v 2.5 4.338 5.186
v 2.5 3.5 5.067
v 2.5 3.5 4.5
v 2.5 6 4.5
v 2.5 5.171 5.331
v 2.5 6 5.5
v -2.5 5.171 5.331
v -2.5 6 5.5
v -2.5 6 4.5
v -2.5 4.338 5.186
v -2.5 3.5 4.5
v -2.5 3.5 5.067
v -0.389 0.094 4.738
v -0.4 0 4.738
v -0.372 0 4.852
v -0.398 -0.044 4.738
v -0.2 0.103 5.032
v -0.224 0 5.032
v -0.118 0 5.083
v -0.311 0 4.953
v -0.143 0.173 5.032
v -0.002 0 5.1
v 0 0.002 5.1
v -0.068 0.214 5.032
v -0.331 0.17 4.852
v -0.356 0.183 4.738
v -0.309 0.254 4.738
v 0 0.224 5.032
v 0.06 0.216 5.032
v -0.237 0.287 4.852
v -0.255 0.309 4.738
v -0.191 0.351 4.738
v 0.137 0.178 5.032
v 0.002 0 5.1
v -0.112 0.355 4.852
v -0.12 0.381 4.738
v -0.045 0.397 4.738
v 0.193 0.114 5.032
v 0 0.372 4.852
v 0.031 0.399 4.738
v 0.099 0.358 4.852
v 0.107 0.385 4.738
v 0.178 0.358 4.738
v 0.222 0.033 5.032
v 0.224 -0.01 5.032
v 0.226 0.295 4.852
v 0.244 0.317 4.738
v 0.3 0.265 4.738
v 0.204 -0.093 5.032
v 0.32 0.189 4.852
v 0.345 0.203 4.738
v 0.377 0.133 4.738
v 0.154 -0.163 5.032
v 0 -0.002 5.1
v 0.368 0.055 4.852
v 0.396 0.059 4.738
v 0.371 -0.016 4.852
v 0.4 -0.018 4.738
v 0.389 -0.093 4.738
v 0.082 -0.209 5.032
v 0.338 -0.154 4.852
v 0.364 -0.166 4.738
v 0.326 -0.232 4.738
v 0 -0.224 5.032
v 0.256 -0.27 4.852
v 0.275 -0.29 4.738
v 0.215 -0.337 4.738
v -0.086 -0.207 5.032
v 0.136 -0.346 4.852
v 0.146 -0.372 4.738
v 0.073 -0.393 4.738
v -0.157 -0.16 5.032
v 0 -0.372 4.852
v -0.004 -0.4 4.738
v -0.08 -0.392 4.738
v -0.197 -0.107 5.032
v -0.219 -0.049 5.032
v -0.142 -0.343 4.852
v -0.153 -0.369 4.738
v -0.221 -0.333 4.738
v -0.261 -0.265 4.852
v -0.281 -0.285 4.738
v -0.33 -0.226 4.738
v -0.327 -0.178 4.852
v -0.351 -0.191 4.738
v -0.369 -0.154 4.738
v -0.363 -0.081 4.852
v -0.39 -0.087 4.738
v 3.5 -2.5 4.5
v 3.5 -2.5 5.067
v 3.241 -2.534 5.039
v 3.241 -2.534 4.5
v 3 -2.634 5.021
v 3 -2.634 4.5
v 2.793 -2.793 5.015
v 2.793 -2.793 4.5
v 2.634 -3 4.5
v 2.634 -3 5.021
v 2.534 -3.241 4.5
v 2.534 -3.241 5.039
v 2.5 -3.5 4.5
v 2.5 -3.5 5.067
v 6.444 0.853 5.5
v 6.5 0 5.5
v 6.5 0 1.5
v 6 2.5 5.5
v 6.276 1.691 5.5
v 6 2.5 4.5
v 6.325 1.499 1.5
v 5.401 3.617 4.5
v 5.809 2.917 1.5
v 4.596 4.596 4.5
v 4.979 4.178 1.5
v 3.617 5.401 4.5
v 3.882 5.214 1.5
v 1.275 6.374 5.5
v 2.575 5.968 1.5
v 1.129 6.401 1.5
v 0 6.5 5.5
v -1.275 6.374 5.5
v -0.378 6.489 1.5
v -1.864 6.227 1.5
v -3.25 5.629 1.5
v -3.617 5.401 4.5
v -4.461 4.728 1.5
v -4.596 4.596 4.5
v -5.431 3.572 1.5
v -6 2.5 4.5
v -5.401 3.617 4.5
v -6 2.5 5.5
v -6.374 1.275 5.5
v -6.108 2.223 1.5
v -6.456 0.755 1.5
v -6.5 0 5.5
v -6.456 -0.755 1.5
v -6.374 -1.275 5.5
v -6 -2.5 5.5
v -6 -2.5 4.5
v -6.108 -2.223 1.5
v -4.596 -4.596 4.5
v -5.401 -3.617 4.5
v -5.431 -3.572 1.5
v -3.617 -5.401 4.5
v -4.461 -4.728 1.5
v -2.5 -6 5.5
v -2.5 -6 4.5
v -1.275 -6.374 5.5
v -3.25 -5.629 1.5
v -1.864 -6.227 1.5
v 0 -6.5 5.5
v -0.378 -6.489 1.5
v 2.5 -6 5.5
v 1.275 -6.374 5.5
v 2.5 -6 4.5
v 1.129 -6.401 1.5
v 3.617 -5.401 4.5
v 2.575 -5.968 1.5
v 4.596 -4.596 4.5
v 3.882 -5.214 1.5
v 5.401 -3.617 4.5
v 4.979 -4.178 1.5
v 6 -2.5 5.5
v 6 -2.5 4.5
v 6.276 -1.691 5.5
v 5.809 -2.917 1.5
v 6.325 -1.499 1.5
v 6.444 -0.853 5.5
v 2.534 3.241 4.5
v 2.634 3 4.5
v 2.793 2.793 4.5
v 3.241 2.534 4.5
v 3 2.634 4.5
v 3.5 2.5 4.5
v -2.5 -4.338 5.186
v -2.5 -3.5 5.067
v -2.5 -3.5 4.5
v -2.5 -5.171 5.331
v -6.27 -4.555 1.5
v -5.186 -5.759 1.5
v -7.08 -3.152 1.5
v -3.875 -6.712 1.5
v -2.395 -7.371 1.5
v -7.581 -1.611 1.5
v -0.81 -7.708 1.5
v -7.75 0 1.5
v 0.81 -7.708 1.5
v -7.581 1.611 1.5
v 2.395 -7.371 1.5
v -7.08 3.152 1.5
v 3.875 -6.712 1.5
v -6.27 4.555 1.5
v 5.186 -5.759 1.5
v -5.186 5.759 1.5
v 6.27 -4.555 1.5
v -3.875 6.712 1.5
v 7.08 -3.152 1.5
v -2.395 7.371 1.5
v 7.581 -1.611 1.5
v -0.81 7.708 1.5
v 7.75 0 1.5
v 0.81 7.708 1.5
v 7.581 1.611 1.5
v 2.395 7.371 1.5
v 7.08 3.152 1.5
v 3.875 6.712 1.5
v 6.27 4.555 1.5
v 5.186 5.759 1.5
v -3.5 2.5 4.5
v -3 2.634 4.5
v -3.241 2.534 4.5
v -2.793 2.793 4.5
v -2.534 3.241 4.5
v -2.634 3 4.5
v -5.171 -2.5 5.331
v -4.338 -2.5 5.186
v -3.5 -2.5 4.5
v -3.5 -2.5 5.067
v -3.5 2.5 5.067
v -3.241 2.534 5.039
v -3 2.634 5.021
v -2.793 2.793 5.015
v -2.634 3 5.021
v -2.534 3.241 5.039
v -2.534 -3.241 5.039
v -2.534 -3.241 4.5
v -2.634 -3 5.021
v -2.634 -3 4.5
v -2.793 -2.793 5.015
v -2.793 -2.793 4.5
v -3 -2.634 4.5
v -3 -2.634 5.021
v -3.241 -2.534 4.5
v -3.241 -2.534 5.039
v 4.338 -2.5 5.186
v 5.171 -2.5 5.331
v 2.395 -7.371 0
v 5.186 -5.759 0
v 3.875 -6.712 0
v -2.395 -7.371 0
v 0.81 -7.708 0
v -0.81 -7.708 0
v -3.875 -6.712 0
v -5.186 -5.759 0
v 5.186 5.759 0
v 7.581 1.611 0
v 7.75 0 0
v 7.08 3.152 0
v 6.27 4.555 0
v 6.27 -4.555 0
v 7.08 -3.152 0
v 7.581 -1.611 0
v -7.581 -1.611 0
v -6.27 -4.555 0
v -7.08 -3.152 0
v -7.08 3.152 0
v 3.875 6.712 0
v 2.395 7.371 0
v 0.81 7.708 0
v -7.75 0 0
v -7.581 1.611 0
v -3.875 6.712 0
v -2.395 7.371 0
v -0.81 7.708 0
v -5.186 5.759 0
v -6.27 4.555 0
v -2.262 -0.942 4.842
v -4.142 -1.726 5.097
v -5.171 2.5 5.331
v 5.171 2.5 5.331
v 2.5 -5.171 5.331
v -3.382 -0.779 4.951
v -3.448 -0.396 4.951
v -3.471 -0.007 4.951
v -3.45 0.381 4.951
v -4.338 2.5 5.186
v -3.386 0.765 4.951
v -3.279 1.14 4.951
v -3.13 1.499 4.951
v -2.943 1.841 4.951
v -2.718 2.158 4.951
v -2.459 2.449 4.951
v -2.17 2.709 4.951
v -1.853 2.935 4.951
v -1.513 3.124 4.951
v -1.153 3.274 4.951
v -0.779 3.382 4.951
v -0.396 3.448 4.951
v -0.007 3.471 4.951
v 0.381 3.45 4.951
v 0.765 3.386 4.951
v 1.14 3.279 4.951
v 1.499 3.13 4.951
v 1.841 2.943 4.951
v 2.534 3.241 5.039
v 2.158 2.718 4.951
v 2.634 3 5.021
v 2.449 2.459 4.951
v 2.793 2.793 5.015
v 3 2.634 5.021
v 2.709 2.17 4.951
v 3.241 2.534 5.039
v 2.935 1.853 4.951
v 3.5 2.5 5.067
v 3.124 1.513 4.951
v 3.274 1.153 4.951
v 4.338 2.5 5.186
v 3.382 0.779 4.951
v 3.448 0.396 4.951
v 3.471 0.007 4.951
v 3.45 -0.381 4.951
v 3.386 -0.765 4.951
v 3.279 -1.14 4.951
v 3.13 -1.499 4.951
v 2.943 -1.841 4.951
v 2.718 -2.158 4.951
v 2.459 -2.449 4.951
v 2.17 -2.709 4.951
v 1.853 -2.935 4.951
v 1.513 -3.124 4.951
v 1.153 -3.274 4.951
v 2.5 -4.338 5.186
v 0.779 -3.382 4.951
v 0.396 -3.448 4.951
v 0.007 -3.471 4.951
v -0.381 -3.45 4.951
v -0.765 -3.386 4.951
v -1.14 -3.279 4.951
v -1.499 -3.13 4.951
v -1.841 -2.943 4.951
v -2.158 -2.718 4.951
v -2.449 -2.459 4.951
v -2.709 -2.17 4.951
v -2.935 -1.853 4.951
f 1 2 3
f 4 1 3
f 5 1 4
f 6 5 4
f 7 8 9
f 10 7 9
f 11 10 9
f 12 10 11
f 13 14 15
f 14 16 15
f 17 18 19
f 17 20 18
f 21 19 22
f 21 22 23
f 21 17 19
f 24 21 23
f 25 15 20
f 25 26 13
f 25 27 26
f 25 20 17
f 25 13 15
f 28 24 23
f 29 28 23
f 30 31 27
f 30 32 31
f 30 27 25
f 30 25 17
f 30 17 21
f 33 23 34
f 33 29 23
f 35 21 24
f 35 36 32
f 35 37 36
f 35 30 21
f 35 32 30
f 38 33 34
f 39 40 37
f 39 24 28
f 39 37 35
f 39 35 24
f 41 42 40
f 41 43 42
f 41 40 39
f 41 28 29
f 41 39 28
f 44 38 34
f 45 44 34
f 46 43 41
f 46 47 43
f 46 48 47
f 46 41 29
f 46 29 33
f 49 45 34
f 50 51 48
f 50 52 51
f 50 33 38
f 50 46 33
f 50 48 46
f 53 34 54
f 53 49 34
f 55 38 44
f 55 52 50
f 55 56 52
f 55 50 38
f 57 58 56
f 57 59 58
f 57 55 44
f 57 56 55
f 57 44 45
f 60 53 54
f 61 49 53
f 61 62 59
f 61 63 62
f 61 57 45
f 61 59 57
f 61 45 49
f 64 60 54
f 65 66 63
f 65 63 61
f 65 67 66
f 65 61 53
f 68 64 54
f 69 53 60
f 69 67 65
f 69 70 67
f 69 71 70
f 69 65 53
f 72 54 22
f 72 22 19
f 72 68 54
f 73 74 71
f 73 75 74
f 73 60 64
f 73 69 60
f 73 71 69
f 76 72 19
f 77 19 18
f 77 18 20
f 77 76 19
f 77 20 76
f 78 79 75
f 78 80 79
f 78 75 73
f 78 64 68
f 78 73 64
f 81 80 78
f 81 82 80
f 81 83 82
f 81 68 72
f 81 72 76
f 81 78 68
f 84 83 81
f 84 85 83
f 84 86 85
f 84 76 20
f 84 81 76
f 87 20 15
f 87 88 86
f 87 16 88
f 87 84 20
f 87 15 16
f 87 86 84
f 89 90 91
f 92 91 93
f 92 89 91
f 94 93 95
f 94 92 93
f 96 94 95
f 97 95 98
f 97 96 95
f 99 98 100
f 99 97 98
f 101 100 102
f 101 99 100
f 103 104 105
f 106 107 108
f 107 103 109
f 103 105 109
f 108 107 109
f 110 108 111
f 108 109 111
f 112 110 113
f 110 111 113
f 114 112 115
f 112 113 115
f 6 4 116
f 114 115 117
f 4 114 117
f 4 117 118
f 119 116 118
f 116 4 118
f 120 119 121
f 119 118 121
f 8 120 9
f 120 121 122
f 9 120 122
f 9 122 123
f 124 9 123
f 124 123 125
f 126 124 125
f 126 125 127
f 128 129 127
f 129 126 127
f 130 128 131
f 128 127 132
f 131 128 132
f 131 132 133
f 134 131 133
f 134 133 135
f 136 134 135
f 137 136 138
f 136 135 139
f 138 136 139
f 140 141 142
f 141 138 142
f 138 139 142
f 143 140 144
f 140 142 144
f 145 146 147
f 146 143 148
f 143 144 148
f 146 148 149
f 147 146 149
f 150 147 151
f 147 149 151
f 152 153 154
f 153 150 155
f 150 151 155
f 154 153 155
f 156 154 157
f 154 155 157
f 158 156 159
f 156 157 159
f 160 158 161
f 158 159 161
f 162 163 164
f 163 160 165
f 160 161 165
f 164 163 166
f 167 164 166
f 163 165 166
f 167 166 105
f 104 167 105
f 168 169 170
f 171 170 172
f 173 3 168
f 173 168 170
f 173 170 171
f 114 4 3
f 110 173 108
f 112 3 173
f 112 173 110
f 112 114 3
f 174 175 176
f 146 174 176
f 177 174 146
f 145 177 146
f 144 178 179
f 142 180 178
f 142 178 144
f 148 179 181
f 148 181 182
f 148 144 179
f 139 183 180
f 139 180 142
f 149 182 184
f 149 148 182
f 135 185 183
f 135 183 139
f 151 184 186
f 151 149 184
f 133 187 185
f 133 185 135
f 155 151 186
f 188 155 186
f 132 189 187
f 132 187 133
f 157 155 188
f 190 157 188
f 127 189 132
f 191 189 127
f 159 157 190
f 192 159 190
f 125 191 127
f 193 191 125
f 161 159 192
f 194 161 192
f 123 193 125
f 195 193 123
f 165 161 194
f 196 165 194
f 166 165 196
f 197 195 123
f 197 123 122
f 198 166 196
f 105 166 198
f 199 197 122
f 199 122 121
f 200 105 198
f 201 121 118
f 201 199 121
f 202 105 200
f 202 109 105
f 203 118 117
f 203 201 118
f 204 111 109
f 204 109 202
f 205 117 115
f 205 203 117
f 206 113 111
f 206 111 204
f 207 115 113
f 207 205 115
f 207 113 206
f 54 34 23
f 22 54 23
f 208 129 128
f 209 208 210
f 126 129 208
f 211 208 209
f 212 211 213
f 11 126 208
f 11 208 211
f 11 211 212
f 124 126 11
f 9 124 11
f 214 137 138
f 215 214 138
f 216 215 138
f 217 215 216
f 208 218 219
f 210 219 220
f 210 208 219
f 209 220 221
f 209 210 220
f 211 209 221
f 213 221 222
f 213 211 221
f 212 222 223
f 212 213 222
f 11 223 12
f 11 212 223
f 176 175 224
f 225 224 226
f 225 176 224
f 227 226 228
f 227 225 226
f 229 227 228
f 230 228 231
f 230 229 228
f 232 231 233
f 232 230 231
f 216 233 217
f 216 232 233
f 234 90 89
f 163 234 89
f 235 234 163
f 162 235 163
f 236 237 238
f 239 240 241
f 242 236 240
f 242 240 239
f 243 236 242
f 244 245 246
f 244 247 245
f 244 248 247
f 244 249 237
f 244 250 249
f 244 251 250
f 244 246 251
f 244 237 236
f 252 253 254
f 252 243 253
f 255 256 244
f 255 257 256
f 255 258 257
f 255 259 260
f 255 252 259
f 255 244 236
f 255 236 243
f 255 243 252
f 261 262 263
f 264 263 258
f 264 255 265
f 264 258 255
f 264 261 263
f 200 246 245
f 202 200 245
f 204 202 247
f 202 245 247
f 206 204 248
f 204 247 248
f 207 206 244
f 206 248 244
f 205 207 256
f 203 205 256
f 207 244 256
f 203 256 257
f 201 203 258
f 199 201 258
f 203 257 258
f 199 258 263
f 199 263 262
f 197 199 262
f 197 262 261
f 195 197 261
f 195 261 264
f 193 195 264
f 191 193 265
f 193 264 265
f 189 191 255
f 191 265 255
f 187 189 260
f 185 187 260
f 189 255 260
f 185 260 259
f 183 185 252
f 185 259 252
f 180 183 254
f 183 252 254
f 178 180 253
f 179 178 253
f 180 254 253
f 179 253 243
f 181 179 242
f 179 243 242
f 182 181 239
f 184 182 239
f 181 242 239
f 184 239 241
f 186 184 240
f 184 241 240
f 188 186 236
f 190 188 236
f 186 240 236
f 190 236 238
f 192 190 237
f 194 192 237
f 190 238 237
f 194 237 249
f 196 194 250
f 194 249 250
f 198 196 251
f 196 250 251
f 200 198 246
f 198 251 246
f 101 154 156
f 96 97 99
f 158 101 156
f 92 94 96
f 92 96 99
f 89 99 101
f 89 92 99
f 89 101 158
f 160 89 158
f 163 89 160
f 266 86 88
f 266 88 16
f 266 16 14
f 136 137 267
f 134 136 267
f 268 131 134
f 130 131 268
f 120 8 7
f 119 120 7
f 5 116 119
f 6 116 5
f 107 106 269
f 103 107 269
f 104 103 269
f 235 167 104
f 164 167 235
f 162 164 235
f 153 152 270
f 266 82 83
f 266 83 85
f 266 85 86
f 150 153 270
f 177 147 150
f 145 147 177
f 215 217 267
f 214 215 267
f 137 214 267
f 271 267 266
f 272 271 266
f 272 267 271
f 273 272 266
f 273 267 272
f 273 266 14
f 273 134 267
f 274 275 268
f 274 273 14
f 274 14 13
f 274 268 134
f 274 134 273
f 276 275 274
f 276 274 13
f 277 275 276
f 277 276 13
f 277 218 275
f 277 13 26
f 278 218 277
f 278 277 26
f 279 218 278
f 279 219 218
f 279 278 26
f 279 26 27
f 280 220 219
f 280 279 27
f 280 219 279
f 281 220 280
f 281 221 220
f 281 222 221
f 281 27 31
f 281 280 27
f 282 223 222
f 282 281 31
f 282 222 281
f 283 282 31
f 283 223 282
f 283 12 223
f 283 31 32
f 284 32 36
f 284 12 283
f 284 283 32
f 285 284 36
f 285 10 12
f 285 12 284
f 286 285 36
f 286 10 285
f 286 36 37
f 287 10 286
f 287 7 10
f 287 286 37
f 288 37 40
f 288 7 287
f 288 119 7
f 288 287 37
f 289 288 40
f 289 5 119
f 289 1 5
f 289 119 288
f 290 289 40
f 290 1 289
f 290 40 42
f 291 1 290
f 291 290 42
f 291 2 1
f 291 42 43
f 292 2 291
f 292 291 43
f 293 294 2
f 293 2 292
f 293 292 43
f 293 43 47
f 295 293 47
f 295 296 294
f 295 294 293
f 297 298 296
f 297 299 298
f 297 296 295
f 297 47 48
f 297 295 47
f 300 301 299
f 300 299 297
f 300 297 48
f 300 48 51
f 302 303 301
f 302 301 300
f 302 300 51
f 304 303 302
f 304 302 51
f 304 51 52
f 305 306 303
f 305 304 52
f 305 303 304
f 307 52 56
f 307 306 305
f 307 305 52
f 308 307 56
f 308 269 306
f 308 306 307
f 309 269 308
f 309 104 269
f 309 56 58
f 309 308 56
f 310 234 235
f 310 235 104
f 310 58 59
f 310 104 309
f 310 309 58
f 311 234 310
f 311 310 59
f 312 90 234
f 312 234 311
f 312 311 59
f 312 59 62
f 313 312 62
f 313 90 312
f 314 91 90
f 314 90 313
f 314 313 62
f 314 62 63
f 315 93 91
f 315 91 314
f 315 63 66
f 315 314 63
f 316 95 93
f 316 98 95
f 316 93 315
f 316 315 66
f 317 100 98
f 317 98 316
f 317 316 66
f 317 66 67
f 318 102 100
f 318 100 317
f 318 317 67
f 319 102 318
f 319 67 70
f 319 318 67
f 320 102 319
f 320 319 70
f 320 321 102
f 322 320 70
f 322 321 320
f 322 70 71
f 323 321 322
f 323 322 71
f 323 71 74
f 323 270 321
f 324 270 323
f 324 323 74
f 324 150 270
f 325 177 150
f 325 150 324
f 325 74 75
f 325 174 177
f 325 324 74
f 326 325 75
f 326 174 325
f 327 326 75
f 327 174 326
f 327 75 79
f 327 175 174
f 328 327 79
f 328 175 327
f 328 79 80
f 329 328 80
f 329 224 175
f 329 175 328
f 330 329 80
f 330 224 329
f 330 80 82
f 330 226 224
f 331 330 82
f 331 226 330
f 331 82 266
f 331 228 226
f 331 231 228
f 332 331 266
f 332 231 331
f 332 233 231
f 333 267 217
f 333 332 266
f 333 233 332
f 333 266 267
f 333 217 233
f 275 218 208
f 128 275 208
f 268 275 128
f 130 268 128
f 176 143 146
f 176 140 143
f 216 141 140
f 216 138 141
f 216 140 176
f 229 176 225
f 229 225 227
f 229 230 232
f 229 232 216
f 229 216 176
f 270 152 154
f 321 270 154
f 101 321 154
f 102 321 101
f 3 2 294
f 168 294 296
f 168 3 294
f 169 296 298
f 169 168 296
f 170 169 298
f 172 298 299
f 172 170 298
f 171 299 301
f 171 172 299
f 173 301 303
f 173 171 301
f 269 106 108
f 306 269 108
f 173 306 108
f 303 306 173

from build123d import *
from build123d.topology import SkipClean

# Parameters (mm, degrees)
SKETCH_1_R          = 7.75
EXTRUDE_1_DEPTH     = 1.5
SKETCH_2_R          = 6.5
EXTRUDE_2_DEPTH     = 4
SKETCH_4_W          = 19
SKETCH_4_H          = 19
CUT_EXTRUDE_1_DEPTH = 1
SKETCH_5_R          = 0.4
EXTRUDE_3_DEPTH     = 5.1
FILLET_1_R          = 0.4
FILLET_2_R          = 1


with BuildPart() as part:
    # 草图1 → 凸台-拉伸1 (new body)
    with BuildSketch(Plane.XY):
        Circle(SKETCH_1_R)
    extrude(amount=EXTRUDE_1_DEPTH)

    # 草图2 → 凸台-拉伸2 (add)
    with BuildSketch(Plane.XY.offset(1.5)):
        Circle(SKETCH_2_R)
    extrude(amount=EXTRUDE_2_DEPTH)

    # 草图4 → 切除-拉伸1 (cut)
    with BuildSketch(Plane.XY.offset(5.5)):
        Rectangle(SKETCH_4_W, SKETCH_4_H)
        Polygon((-2.5, 7.5), (-2.5, 2.5), (-7.5, 2.5), (-7.5, -2.5), (-2.5, -2.5), (-2.5, -7.5), (2.5, -7.5), (2.5, -2.5), (7.5, -2.5), (7.5, 2.5), (2.5, 2.5), (2.5, 7.5), align=None, mode=Mode.SUBTRACT)
    extrude(amount=-CUT_EXTRUDE_1_DEPTH, mode=Mode.SUBTRACT)

    # 草图3 → 切除-旋转2 (revolve, cut)
    with SkipClean():  # the faces are left unmerged after this step: merging them gives an invalid solid
        with BuildSketch(Plane(origin=(0, 0, 0), x_dir=(1, 0, 0), z_dir=(0, 1, 0)), mode=Mode.PRIVATE) as cut_revolve_2_sk:
            with BuildLine():
                Line((-6.5, -5.5), (0, -5.5))
                Line((0, -5.5), (0, -4.735087663))
                ThreePointArc((0, -4.735087663), (-3.272426122, -4.926973248), (-6.5, -5.5))
            make_face()
            with BuildLine():
                Line((0, -4.735087663), (0, -5.5))
                Line((0, -5.5), (6.5, -5.5))
                ThreePointArc((6.5, -5.5), (3.272426122, -4.926973248), (0, -4.735087663))
            make_face()
        revolve(cut_revolve_2_sk.sketch.rotate(Axis((0, 0, 1000), (0, 0, -1)), 337.380135052), axis=Axis((0, 0, 1000), (0, 0, -1)), mode=Mode.SUBTRACT)
    add(part.part.scale(1), mode=Mode.REPLACE)  # the faces are merged on a copy

    # 草图5 → 凸台-拉伸3 (add)
    with BuildSketch(Plane(origin=(0, 0, 0), x_dir=(-1, 0, 0), z_dir=(0, 0, -1))):
        Circle(SKETCH_5_R)
    extrude(amount=-EXTRUDE_3_DEPTH)

    # 圆角1
    # the kernel refuses this fillet: 0.4 mm, written as the material it takes off along each edge
    with BuildSketch(Plane(origin=(0, 0, 5.1), x_dir=(-1, 0, 0), z_dir=(0, -1, 0))) as fillet_1_piece_1:
        with BuildLine():
            CenterArc((0.001803842, 0.4), FILLET_1_R, 270, 84.556601085)
            Line((0.001803842, 0), (0.001803842, -0.008))
            Line((0.001803842, -0.008), (0.4, -0.008))
            Line((0.4, -0.008), (0.408, 0))
            ThreePointArc((0.408, 0), (0.408, 0.181027524), (0.407963923, 0.36129615))
            Line((0.407963923, 0.36129615), (0.4, 0.362055049))
        make_face()
    revolve(axis=Axis((0, 0, 5.1), (0, 0, -1)), mode=Mode.SUBTRACT)

    # 圆角2
    fillet_2_edges = [part.edges().sort_by_distance(p)[0] for p in [
        (2.5, 2.5, 4.729599419),
        (2.5, -2.5, 4.729599419),
        (-2.5, -2.5, 4.729599419),
        (-2.5, 2.5, 4.729599419),
    ]]
    fillet(fillet_2_edges, radius=FILLET_2_R)


solid = part.part
